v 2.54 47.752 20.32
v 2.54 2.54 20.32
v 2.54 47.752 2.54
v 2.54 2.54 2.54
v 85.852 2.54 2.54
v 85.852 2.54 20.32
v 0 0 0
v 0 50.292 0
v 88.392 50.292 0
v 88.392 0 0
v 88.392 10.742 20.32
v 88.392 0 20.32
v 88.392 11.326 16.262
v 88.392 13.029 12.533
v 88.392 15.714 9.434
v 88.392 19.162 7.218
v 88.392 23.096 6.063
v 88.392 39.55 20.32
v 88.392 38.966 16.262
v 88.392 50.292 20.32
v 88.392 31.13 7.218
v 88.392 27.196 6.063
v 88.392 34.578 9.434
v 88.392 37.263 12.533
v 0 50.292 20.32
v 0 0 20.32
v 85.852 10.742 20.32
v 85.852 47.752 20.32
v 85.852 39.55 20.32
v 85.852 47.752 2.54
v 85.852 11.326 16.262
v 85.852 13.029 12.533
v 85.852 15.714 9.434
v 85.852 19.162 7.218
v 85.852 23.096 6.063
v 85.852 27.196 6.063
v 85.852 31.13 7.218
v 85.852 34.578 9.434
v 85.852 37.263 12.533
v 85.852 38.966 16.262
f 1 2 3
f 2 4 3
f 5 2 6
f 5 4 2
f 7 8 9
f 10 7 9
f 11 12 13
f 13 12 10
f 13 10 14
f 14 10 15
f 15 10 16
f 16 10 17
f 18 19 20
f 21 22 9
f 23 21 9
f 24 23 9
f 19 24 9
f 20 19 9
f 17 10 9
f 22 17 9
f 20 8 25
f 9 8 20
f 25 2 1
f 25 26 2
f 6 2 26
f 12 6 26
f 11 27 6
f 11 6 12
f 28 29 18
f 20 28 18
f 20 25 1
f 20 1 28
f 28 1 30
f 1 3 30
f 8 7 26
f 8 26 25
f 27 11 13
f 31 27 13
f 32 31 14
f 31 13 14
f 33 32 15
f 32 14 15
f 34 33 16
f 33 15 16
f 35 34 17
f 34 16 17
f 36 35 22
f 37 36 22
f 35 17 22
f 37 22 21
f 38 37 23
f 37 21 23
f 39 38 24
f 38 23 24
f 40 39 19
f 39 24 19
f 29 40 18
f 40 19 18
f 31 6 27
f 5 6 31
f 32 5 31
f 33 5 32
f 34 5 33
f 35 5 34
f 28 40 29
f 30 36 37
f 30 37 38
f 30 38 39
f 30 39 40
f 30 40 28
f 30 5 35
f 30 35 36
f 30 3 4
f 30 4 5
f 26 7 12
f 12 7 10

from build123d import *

# Parameters (mm, degrees)
F0_W     = 88.392
F0_H     = 50.292
F1_DEPTH = 20.32
F2_T     = -2.54
F4_DEPTH = 25.4


with BuildPart() as f1:
    # F0 (on Top) → F1 (new body)
    with BuildSketch(Plane.XY):
        with Locations((44.196, 25.146)):
            Rectangle(F0_W, F0_H)
    extrude(amount=F1_DEPTH)

    # F2
    f2_openings = [f1.faces().sort_by_distance(p)[0] for p in [
        (44.196, 25.146, 20.32),
    ]]
    offset(amount=F2_T, openings=f2_openings)

    # F3 (on face) → F4 (cut)
    with BuildSketch(Plane.YZ.offset(88.392)):
        with BuildLine():
            ThreePointArc((10.742303, 20.32), (25.146, 5.916303), (39.549697, 20.32))
            Line((39.549697, 20.32), (10.742303, 20.32))
        make_face()
    extrude(amount=-F4_DEPTH, mode=Mode.SUBTRACT)


solid = f1.part
